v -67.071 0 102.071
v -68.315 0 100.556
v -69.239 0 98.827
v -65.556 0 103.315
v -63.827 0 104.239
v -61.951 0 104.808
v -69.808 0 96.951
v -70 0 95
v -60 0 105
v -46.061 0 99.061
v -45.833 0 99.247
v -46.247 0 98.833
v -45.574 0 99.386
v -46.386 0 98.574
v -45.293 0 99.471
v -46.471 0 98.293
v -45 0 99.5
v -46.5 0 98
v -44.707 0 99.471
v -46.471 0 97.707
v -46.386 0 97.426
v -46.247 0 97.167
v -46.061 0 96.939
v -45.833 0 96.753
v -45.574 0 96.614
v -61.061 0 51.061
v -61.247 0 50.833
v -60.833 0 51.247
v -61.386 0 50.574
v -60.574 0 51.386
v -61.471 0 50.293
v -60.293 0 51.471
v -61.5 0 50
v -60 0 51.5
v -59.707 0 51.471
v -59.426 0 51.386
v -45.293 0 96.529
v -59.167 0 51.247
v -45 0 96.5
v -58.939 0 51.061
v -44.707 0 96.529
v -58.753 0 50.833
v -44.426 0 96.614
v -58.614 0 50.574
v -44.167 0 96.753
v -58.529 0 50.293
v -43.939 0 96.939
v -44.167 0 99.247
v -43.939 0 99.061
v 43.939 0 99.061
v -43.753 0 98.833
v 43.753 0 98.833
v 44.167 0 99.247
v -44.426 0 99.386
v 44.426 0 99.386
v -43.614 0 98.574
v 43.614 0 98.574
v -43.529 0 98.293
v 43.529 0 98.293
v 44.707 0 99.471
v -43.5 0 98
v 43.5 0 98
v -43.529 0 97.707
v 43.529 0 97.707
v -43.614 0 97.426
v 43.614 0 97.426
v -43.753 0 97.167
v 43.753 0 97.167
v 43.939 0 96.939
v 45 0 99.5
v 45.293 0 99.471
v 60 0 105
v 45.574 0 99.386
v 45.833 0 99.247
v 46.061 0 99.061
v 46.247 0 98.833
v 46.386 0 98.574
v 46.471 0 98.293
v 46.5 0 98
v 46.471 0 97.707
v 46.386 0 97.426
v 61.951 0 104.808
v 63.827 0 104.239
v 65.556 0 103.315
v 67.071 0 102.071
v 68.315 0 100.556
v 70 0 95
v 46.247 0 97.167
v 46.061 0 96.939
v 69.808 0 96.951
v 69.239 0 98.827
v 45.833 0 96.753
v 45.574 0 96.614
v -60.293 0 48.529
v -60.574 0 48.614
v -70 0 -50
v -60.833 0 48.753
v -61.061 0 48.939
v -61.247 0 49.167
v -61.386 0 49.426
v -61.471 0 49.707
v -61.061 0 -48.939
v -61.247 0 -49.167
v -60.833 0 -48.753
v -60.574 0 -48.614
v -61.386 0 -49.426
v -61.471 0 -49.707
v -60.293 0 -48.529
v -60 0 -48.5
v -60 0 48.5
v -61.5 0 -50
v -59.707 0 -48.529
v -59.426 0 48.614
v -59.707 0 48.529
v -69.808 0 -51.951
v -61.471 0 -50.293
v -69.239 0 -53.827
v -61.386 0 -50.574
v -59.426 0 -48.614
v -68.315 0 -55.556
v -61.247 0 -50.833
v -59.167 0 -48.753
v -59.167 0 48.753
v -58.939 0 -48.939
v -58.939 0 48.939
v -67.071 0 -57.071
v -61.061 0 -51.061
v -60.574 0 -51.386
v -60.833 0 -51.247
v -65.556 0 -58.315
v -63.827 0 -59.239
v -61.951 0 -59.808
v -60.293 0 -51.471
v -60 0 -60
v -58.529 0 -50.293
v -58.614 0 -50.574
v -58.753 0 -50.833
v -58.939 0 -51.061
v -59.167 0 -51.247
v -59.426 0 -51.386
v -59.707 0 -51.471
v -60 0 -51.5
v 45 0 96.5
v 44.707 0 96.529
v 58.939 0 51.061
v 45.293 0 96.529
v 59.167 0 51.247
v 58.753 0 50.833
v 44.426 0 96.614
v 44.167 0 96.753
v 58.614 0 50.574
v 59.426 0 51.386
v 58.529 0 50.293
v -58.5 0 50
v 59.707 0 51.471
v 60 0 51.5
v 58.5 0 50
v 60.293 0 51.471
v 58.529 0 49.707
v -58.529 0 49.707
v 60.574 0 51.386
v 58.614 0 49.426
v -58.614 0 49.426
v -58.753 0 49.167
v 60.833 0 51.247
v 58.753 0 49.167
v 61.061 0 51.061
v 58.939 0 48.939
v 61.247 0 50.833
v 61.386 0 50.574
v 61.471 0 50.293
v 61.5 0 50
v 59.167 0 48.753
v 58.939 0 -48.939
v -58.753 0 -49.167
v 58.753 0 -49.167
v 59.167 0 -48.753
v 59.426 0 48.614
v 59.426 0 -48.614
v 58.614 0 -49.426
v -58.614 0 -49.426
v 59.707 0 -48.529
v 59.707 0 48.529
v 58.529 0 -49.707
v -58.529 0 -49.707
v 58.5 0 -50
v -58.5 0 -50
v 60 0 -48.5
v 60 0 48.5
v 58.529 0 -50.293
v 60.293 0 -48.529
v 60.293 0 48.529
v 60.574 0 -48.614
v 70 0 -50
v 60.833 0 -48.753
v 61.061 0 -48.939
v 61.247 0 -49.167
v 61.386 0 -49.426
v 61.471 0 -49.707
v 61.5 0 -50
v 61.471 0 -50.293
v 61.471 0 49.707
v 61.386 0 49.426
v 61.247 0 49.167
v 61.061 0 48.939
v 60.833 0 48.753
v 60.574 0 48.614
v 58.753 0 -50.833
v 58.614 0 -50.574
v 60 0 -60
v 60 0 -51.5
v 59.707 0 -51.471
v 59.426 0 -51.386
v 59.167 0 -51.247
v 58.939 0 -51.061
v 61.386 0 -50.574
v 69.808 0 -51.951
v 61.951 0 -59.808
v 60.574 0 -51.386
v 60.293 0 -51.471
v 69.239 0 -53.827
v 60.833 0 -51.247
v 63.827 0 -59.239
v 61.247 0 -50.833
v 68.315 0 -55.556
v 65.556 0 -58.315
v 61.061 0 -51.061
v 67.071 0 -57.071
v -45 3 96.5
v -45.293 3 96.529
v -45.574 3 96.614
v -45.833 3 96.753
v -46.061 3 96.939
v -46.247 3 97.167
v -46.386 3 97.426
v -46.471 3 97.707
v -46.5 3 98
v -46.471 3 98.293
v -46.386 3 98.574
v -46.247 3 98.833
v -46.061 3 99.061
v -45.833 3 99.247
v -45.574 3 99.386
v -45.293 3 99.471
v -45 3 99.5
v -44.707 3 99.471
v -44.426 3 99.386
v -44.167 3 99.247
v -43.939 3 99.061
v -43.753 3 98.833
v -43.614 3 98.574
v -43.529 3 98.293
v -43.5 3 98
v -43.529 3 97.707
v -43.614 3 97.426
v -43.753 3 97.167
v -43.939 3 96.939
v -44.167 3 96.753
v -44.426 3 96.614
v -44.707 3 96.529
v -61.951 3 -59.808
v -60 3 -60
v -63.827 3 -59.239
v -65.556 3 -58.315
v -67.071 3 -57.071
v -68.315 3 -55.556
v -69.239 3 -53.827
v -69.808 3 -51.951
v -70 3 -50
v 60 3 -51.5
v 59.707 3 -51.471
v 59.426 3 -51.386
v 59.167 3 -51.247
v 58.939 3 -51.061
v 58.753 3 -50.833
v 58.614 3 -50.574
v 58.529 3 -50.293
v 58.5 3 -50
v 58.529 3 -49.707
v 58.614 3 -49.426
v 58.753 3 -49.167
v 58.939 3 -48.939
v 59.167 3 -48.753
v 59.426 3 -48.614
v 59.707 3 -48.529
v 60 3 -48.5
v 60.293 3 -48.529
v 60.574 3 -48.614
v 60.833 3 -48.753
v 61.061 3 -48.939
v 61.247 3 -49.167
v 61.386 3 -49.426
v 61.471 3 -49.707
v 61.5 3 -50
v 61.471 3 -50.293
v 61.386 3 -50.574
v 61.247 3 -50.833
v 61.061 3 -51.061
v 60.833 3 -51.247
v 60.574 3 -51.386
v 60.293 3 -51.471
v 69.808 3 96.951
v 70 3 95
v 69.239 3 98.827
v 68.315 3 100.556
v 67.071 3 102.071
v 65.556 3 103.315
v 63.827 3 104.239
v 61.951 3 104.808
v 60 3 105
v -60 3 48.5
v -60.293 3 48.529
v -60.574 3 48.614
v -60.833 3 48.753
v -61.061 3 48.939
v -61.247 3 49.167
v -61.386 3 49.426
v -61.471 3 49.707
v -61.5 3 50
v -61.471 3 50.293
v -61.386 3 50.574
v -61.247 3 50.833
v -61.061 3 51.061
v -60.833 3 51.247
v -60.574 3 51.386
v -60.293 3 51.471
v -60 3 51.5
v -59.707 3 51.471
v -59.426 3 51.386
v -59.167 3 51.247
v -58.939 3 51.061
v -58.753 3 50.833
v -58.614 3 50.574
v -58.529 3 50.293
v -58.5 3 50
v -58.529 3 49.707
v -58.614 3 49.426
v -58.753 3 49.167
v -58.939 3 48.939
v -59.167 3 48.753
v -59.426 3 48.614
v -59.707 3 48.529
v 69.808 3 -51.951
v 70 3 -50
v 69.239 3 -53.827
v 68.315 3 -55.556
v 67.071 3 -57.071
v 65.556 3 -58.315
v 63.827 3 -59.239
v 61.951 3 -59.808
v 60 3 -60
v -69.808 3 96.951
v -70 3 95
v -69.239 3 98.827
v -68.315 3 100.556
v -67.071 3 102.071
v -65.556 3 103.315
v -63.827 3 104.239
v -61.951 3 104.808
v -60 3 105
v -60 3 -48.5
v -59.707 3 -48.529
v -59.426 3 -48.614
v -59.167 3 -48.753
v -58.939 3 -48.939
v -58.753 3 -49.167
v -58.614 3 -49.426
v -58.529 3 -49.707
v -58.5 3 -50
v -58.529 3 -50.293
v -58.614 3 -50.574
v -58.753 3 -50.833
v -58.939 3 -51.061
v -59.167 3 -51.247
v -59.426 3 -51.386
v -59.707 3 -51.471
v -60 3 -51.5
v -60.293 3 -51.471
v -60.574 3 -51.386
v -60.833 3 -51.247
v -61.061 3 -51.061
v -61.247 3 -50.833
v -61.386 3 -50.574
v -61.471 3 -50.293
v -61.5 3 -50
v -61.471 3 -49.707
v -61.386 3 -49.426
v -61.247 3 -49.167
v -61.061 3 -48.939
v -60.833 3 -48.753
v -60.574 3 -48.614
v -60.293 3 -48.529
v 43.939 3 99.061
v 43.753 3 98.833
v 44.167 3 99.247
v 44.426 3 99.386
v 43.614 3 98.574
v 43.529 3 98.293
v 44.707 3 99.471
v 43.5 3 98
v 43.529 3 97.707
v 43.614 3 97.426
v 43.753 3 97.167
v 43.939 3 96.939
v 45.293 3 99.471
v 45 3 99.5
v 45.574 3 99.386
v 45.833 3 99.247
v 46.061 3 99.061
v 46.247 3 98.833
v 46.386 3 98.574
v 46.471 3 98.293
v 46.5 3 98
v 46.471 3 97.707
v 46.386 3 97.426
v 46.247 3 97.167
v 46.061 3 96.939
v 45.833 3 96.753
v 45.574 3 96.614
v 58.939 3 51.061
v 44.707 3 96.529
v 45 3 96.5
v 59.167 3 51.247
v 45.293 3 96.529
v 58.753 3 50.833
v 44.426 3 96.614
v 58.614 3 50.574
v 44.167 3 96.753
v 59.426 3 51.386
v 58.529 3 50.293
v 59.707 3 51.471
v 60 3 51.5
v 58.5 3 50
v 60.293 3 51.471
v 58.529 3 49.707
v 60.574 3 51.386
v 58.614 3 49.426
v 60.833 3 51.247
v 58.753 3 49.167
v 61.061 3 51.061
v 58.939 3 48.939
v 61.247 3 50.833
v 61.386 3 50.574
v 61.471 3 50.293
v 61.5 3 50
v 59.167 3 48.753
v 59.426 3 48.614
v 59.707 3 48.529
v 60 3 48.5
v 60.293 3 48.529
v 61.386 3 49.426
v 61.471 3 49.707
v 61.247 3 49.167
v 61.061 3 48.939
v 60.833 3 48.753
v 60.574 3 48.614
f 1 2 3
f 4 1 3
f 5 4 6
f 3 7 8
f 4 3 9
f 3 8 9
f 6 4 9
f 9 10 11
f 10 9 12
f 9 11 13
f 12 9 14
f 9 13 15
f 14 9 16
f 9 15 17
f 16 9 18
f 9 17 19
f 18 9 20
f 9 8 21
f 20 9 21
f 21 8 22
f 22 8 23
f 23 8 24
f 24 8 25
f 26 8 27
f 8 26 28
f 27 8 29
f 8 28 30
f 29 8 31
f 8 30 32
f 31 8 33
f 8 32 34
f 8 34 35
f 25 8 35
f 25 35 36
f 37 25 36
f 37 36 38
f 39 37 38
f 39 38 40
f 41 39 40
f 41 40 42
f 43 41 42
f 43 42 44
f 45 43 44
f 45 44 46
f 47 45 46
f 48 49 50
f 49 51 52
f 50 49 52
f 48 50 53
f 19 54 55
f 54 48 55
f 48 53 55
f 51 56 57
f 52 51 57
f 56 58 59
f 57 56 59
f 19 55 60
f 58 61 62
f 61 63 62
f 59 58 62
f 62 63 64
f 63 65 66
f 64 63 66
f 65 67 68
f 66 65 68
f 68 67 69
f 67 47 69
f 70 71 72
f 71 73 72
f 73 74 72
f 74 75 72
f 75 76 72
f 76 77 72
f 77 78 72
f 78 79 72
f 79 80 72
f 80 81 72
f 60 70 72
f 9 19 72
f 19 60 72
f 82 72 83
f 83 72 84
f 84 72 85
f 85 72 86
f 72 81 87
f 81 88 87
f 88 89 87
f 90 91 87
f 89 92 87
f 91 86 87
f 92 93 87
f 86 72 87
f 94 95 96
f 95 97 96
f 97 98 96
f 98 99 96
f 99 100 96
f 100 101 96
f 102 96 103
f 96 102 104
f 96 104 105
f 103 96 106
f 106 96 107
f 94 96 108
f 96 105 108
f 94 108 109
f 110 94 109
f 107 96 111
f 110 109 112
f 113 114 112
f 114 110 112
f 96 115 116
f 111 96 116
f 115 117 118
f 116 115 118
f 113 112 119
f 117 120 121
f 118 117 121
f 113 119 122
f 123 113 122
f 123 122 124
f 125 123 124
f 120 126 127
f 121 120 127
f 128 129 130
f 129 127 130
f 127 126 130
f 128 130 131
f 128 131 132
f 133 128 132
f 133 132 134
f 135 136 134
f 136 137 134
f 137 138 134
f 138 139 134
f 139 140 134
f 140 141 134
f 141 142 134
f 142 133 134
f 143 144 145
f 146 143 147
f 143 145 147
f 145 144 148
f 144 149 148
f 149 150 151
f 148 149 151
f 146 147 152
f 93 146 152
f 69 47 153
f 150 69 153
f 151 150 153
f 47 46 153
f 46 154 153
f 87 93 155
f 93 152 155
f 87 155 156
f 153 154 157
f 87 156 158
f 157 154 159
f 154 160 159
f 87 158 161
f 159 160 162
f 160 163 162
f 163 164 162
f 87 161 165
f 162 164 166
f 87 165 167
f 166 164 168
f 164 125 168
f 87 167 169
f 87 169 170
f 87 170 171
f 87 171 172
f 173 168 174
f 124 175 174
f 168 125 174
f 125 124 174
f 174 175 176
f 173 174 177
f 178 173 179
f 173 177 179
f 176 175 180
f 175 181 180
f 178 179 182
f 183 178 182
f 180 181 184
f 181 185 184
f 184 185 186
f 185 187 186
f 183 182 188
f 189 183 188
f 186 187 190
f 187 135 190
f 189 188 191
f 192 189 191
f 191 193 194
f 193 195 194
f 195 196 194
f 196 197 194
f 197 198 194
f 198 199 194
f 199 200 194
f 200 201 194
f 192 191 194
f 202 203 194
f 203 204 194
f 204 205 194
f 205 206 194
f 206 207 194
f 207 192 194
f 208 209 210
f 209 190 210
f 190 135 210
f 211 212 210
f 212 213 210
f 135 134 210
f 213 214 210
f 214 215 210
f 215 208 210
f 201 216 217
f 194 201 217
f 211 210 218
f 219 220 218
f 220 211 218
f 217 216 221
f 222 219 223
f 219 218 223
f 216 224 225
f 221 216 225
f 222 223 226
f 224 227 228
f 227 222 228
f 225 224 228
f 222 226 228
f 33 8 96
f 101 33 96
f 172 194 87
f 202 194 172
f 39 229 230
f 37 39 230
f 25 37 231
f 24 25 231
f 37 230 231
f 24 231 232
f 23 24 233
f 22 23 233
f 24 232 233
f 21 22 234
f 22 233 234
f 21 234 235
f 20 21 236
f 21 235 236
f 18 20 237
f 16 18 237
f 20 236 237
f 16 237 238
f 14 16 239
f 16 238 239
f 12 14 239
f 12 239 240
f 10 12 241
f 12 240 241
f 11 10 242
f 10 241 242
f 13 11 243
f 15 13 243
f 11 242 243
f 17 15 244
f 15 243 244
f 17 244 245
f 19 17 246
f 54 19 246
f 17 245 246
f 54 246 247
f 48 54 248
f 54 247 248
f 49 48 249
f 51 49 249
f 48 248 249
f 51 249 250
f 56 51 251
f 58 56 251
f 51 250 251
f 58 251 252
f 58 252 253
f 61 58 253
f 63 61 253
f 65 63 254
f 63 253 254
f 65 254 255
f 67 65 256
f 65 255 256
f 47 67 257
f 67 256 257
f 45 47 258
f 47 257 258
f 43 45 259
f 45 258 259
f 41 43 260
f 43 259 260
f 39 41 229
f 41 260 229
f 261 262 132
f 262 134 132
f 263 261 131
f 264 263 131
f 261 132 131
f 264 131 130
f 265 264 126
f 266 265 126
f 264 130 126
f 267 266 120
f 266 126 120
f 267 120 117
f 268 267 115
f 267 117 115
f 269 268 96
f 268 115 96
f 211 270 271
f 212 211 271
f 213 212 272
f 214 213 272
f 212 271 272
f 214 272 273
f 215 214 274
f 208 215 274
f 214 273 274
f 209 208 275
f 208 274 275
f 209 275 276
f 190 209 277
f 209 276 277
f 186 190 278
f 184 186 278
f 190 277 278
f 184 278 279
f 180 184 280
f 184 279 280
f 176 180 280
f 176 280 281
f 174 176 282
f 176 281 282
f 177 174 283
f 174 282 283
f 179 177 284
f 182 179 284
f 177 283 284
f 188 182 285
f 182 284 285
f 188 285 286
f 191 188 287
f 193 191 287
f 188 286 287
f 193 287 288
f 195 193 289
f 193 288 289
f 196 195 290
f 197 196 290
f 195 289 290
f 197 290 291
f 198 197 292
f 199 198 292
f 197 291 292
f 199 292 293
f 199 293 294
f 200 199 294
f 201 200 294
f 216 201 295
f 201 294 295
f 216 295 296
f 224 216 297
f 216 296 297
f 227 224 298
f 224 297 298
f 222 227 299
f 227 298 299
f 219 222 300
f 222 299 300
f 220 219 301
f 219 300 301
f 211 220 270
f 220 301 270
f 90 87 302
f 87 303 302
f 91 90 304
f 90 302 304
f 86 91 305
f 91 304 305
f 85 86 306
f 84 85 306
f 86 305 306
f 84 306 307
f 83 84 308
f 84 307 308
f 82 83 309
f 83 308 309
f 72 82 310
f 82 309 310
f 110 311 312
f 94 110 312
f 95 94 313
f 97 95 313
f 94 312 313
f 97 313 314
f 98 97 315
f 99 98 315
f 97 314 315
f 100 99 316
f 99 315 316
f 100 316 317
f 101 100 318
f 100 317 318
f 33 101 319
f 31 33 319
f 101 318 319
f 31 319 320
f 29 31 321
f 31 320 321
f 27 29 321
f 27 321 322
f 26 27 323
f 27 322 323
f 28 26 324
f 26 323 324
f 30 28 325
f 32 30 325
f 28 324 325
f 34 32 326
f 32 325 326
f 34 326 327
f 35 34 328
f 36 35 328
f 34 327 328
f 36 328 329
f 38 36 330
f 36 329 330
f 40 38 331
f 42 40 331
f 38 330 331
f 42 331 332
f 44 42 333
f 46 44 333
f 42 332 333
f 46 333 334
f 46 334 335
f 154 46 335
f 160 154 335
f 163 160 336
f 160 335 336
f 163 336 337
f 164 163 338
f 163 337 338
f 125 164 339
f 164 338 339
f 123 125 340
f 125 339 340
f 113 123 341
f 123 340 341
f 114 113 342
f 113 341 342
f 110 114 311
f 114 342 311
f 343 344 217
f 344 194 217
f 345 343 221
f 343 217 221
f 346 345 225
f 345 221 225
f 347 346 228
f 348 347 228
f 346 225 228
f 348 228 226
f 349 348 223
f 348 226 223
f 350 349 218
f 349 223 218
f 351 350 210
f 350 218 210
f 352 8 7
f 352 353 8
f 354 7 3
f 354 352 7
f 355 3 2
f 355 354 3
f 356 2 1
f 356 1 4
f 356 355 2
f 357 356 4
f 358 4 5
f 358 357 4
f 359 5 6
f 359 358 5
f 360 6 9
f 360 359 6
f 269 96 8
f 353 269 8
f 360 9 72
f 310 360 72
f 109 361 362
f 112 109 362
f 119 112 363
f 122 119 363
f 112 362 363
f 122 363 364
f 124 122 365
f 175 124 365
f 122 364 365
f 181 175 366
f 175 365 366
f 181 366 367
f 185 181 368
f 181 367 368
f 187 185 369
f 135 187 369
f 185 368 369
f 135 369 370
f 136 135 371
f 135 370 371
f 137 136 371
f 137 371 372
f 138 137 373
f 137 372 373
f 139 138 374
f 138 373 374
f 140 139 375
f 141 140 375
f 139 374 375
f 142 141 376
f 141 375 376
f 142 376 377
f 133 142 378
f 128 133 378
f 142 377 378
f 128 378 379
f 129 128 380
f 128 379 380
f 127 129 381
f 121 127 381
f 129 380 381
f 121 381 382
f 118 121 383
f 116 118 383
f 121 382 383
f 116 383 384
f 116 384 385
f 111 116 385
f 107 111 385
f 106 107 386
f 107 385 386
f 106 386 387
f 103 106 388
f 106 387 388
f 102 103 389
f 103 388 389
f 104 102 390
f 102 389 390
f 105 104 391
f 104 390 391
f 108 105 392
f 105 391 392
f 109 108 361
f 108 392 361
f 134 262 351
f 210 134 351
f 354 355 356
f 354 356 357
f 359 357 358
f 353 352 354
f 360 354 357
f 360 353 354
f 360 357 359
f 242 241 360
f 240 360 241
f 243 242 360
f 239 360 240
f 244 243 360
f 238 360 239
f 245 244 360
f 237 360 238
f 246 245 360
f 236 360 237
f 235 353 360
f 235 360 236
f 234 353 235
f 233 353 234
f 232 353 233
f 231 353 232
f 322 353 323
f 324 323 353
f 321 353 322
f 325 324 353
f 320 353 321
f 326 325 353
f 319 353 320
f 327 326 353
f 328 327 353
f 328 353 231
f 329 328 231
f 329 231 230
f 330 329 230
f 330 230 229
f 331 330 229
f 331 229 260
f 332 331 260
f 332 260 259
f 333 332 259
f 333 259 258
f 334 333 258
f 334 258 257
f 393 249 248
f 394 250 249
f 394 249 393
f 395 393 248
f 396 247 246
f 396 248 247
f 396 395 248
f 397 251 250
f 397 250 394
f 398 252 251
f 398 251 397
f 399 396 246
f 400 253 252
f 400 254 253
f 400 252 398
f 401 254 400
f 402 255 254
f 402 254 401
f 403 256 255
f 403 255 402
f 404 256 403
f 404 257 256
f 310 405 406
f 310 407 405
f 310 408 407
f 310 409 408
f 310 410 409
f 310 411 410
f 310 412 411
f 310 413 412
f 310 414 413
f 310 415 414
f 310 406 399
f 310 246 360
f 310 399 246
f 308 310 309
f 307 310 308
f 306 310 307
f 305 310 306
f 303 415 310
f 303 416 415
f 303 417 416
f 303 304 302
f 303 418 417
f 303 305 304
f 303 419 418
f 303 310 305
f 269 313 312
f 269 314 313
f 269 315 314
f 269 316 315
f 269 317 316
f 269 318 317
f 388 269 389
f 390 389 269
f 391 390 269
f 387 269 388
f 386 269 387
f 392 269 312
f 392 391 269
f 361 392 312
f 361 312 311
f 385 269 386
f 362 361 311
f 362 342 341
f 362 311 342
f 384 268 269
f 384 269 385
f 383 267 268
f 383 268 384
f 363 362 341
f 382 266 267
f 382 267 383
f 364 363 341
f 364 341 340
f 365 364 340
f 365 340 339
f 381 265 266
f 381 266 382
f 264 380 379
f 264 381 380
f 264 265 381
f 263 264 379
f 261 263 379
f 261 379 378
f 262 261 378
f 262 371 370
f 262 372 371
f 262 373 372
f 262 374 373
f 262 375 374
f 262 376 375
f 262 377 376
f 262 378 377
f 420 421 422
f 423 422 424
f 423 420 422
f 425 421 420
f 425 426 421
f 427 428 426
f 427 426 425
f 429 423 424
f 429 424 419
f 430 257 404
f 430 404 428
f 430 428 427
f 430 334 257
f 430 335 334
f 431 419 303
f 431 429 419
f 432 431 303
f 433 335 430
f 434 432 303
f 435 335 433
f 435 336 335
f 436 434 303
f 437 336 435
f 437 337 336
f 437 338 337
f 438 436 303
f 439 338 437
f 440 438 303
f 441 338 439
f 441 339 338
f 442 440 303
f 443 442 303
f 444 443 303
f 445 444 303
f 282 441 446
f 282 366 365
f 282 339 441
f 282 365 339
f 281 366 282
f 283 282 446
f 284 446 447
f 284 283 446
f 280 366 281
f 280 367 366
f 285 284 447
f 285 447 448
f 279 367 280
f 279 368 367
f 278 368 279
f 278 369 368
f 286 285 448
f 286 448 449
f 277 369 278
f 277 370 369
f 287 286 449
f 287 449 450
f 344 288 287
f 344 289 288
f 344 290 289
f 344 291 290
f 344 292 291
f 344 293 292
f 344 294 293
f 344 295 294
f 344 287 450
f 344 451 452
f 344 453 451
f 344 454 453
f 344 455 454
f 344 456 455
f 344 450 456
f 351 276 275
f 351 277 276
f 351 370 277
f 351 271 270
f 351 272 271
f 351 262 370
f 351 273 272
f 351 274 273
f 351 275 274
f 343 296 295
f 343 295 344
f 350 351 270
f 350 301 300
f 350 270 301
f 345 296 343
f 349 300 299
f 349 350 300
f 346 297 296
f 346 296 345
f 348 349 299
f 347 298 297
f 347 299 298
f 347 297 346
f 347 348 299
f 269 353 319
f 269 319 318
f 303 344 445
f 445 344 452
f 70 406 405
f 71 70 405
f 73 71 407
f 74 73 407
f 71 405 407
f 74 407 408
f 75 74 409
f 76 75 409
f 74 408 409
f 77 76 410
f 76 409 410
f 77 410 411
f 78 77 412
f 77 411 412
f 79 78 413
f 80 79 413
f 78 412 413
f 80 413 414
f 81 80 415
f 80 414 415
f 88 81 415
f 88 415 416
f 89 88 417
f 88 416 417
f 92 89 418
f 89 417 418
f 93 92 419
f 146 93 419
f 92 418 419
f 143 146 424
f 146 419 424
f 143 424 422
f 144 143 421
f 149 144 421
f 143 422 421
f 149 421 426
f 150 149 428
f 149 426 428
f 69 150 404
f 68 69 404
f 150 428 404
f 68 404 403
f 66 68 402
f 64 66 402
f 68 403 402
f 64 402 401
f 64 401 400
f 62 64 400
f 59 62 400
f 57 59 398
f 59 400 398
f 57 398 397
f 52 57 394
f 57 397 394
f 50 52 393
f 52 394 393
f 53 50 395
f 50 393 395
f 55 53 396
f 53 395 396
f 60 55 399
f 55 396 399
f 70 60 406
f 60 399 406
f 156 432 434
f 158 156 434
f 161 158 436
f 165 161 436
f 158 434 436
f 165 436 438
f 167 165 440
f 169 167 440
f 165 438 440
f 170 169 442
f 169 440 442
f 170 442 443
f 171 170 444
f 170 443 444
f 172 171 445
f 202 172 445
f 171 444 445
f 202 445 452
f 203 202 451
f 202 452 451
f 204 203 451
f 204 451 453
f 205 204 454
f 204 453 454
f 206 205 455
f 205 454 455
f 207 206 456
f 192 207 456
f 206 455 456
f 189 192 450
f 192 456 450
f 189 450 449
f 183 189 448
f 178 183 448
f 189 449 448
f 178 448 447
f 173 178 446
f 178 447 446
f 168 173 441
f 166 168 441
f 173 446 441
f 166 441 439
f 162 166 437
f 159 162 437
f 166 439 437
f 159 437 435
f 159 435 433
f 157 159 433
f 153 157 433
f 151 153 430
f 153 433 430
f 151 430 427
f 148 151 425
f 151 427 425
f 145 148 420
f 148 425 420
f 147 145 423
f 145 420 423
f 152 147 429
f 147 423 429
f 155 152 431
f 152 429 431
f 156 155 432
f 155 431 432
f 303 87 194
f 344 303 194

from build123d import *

# Parameters (mm, degrees)
EXTRUDE_1_DEPTH     = 3
SKETCH_2_R          = 1.5
CUT_EXTRUDE_1_DEPTH = 3
FILLET_1_R          = 10
SKETCH_3_W          = 140
SKETCH_3_H          = 45
CUT_EXTRUDE_2_DEPTH = 10
FILLET_2_R          = 10


with BuildPart() as part:
    # 草图1 → 凸台-拉伸1 (new body)
    with BuildSketch(Plane(origin=(0, 0, 0), x_dir=(1, 0, 0), z_dir=(0, 1, 0))):
        Polygon((70, 105), (-70, 105), (-70, 50), (-70, -50), (-70, -105), (70, -105), (70, -50), (70, 50), align=None)
    extrude(amount=EXTRUDE_1_DEPTH)

    # 草图2 → 切除-拉伸1 (cut)
    with BuildSketch(Plane(origin=(0, 3, 0), x_dir=(1, 0, 0), z_dir=(0, 1, 0))):
        with Locations(Location((-60, 50, 0), (0, 0, 270))):
            Circle(SKETCH_2_R)
        with Locations(Location((60, 50, 0), (0, 0, 90))):
            Circle(SKETCH_2_R)
        with Locations(Location((60, -50, 0), (0, 0, 270))):
            Circle(SKETCH_2_R)
        with Locations(Location((-60, -50, 0), (0, 0, 90))):
            Circle(SKETCH_2_R)
        with Locations(Location((-45, 98, 0), (0, 0, 270))):
            Circle(SKETCH_2_R)
        with Locations(Location((45, 98, 0), (0, 0, 90))):
            Circle(SKETCH_2_R)
        with Locations(Location((45, -98, 0), (0, 0, 270))):
            Circle(SKETCH_2_R)
        with Locations(Location((-45, -98, 0), (0, 0, 90))):
            Circle(SKETCH_2_R)
    extrude(amount=-CUT_EXTRUDE_1_DEPTH, mode=Mode.SUBTRACT)

    # 圆角1
    fillet_1_edges = [part.edges().sort_by_distance(p)[0] for p in [
        (-70, 1.5, 105),
        (70, 1.5, 105),
    ]]
    fillet(fillet_1_edges, radius=FILLET_1_R)

    # 草图3 → 切除-拉伸2 (cut)
    with BuildSketch(Plane(origin=(0, 3, 0), x_dir=(1, 0, 0), z_dir=(0, 1, 0))):
        with Locations((0, 82.5)):
            Rectangle(SKETCH_3_W, SKETCH_3_H)
    extrude(amount=-CUT_EXTRUDE_2_DEPTH, mode=Mode.SUBTRACT)

    # 圆角2
    fillet_2_edges = [part.edges().sort_by_distance(p)[0] for p in [
        (70, 1.5, -60),
        (-70, 1.5, -60),
    ]]
    fillet(fillet_2_edges, radius=FILLET_2_R)


solid = part.part
